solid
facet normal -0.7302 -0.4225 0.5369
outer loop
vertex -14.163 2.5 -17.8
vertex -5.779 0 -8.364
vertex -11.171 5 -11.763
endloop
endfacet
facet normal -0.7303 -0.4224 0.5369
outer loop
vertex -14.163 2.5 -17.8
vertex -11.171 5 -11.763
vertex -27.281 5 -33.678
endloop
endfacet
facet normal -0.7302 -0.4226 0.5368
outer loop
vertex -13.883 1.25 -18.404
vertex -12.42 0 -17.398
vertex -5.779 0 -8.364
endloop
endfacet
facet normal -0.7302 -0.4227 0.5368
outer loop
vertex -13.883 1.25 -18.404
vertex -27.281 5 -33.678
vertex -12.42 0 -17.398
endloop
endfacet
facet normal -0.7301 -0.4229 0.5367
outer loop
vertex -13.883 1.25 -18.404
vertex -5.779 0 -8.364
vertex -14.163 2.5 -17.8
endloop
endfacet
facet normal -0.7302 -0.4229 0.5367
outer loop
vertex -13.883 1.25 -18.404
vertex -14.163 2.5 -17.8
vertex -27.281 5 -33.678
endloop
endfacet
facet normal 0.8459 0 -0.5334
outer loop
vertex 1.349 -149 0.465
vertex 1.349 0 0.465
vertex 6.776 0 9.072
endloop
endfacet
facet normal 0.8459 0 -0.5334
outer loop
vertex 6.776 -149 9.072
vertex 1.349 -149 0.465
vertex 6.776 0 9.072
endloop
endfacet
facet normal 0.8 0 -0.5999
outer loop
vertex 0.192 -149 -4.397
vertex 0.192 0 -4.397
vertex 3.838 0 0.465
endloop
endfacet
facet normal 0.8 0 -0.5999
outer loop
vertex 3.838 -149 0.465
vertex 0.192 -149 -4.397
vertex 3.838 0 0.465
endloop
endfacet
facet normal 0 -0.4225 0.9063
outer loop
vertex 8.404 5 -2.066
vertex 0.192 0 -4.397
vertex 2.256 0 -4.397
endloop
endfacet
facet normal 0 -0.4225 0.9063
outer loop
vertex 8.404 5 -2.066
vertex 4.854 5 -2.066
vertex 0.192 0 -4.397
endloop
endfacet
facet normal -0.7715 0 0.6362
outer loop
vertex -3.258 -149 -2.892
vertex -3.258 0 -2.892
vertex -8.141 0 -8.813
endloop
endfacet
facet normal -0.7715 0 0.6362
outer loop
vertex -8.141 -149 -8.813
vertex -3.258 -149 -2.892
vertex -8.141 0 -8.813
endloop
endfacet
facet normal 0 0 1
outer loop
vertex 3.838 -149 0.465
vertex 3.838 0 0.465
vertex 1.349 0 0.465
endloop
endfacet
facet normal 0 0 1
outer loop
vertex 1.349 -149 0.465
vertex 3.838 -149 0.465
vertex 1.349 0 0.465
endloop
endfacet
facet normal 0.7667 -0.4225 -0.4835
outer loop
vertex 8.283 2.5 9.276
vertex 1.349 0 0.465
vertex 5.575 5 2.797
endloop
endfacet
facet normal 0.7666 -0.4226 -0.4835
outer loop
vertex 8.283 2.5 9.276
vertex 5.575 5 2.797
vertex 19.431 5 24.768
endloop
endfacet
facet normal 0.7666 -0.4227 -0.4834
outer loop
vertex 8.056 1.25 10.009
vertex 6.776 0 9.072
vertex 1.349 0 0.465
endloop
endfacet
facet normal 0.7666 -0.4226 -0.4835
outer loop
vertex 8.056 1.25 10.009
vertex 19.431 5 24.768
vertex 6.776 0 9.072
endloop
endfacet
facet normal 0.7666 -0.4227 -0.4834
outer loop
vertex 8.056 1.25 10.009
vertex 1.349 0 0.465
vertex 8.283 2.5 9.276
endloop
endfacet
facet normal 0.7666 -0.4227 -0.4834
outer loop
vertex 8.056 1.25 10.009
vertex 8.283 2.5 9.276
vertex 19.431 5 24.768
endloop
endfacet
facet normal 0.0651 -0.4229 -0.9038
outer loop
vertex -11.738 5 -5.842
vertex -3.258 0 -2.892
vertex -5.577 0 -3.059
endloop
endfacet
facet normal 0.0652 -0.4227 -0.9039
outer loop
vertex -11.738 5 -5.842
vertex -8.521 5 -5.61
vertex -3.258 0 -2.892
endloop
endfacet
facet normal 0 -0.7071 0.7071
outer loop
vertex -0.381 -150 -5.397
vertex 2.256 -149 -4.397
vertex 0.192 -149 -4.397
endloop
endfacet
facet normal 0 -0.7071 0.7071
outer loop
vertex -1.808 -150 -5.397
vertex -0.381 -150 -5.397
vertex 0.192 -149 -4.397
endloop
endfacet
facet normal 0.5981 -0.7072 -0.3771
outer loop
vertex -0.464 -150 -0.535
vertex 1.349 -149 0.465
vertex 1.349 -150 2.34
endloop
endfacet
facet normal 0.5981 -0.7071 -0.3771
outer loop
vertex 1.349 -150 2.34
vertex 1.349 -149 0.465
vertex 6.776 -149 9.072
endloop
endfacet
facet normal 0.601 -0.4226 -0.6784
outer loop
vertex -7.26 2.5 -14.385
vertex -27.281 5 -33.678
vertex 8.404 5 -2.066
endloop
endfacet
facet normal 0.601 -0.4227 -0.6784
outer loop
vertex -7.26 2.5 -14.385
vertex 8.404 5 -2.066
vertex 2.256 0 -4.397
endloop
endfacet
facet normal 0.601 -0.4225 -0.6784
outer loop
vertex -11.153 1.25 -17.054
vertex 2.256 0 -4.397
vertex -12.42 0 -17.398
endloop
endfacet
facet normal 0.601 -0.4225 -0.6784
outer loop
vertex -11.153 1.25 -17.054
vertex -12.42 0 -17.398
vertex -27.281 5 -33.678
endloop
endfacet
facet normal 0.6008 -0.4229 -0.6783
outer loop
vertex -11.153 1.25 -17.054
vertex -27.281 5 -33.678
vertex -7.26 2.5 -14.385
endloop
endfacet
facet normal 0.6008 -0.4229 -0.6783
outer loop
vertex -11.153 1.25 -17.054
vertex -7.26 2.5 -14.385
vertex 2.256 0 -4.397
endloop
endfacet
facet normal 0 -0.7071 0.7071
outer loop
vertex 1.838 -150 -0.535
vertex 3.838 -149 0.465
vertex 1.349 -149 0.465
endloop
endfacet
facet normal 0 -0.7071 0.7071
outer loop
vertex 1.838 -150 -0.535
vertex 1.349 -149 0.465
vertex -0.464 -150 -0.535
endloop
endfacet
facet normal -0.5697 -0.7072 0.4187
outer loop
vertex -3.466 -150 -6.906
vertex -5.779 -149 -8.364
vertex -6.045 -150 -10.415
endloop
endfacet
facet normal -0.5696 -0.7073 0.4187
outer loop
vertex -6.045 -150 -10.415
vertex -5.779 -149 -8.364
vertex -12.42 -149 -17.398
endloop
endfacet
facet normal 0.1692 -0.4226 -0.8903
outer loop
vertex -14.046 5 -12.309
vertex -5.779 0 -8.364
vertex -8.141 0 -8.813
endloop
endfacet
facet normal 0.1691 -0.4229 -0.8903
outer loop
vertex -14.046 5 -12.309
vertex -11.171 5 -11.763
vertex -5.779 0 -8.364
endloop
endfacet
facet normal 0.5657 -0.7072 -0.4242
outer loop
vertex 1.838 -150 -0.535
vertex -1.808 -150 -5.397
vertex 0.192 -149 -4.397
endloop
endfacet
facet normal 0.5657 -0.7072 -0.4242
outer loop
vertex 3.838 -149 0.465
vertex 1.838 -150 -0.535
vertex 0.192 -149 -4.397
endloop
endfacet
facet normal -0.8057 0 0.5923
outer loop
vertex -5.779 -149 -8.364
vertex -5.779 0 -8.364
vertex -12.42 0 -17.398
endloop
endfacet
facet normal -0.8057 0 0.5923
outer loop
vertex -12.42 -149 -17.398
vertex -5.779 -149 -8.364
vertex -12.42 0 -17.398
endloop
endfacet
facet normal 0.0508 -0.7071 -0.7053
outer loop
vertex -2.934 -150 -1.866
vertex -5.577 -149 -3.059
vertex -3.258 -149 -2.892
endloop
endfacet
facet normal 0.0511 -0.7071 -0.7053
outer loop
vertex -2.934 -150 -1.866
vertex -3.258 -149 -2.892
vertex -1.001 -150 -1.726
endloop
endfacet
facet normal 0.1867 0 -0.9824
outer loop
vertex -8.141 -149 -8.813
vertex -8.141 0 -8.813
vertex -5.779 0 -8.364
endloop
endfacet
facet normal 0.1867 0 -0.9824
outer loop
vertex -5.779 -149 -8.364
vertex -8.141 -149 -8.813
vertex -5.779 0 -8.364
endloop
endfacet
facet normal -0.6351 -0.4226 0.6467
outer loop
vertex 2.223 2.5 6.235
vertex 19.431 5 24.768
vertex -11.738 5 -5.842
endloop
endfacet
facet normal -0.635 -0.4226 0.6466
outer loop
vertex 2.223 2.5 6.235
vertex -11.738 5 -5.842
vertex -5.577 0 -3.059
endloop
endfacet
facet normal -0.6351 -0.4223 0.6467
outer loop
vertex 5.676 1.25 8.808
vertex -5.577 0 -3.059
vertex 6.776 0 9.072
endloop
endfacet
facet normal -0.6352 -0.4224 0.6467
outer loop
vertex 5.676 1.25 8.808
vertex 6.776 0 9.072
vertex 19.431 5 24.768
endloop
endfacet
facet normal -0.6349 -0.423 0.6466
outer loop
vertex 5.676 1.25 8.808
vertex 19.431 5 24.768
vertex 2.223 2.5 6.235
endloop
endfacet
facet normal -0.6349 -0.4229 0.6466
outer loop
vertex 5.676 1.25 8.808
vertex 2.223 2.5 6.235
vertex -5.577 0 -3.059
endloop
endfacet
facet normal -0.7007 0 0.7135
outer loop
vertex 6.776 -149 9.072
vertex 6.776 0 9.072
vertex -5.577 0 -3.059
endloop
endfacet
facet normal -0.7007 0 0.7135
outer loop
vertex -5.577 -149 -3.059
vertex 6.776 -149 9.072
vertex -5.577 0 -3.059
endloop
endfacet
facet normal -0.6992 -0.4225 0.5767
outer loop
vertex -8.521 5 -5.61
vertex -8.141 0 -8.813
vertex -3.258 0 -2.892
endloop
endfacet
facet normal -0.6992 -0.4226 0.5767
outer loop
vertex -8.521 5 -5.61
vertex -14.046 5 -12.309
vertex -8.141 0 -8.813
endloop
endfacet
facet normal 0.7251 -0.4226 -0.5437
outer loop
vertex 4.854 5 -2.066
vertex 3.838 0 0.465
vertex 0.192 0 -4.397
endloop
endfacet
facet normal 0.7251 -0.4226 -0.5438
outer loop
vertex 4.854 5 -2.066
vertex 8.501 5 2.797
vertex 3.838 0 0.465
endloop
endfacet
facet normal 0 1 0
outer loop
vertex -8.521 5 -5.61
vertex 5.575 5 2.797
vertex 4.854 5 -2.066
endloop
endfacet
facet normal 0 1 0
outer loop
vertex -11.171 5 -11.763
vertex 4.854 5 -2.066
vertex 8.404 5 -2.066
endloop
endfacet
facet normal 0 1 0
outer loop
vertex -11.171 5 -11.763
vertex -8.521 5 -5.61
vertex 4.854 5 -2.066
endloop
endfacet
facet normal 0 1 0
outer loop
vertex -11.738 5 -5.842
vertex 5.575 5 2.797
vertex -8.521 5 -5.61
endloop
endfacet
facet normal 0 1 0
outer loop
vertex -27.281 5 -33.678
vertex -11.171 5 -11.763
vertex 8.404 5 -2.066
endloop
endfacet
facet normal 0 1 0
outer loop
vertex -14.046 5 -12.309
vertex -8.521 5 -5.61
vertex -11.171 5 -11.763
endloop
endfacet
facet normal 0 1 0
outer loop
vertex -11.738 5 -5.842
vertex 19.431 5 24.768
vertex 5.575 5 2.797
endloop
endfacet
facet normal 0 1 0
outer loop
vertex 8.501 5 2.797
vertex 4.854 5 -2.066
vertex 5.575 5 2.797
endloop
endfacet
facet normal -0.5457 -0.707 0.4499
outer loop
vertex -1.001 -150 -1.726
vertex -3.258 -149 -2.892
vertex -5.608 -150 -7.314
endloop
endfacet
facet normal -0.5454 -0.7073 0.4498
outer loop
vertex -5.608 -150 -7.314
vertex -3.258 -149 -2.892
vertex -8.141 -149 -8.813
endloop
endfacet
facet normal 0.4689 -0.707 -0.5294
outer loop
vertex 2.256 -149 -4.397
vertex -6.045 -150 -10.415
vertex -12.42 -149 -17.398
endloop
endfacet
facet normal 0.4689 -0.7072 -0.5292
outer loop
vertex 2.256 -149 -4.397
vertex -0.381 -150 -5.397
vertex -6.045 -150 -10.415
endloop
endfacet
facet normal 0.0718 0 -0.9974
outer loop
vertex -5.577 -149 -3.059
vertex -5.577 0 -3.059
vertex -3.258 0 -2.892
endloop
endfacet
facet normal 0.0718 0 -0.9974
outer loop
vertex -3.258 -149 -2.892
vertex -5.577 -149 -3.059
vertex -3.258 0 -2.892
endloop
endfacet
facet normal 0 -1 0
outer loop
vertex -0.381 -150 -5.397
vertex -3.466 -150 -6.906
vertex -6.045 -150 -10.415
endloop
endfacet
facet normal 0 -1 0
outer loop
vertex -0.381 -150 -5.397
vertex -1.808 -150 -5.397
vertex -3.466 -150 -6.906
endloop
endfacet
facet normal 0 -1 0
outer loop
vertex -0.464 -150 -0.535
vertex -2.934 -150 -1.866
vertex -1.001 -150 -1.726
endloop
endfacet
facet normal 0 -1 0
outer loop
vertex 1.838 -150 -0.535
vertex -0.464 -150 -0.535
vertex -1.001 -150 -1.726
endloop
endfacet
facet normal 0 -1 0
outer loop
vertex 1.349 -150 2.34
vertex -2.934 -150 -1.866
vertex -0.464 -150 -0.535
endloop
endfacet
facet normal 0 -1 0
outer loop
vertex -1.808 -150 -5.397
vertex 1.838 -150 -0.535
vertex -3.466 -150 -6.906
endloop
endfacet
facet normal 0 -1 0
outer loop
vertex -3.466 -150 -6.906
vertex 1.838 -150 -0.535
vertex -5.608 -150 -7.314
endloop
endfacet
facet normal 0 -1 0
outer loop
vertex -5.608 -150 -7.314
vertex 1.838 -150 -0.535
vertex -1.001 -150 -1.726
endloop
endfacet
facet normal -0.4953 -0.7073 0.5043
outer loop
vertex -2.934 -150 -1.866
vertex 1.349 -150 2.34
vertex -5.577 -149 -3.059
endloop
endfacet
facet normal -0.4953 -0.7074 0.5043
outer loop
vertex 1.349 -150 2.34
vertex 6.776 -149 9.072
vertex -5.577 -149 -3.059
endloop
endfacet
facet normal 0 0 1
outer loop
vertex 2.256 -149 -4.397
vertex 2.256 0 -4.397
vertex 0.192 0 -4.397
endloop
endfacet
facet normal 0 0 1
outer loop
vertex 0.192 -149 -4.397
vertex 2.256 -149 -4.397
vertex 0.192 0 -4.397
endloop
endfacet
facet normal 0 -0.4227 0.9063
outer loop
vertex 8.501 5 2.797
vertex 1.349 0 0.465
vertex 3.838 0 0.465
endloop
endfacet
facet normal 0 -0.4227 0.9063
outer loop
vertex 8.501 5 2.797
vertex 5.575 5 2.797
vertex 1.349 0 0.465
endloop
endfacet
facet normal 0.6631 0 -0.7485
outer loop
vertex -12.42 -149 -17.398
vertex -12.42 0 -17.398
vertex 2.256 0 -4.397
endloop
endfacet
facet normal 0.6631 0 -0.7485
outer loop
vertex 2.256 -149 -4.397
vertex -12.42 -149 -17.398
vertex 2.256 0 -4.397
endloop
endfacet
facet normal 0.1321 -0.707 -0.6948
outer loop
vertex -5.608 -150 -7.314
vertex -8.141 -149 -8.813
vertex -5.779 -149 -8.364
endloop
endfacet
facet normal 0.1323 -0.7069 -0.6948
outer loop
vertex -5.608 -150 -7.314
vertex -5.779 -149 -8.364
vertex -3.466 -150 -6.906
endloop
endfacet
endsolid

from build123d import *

# Parameters (mm, degrees)
F1_DEPTH = 150
F2_DEPTH = 5
F2_TAPER = -25
F3_SIZE  = 1


with BuildPart() as f1:
    # F0 (on Front) → F1 (new body)
    with BuildSketch(Plane.XZ):
        Polygon((6.776461585, 9.0722467188), (-5.5767488922, -3.059325051), (-3.258036708, -2.8919032872), (-8.1410452514, -8.8131905165), (-5.7786260987, -8.3639572937), (-12.4195150821, -17.3975064051), (2.255862786, -4.3973731032), (0.1915401989, -4.3973731032), (3.8383661048, 0.4654207636), (1.3486526159, 0.4654207636), align=None)
    extrude(amount=F1_DEPTH)

    # F1_face (on face) → F2 (join)
    with BuildSketch(Plane(origin=(-2.1628477345, 0, -4.133992699), x_dir=(1, 0, 0), z_dir=(0, 1, 0))):
        Polygon((2.3543879334, 0.2633804043), (4.4187105205, 0.2633804043), (-10.2566673476, 13.2635137061), (-3.6157783642, 4.2299645948), (-5.9781975168, 4.6791978175), (-1.0951889734, -1.2420894118), (-3.4139011576, -1.074667648), (8.9393093195, -13.2062394177), (3.5115003504, -4.5994134625), (6.0012138393, -4.5994134625), align=None)
    extrude(amount=F2_DEPTH, taper=F2_TAPER)

    # F3
    f3_edges = [f1.edges().sort_by_distance(p)[0] for p in [
        (-5.081826, -150, -10.89744),
        (2.014953, -150, -1.965976),
        (1.223701, -150, -4.397373),
        (2.593509, -150, 0.465421),
        (4.062557, -150, 4.768834),
        (0.599856, -150, 3.006461),
        (-4.417393, -150, -2.975614),
        (-5.699541, -150, -5.852547),
        (-6.959836, -150, -8.588574),
        (-9.099071, -150, -12.880732),
    ]]
    chamfer(f3_edges, length=F3_SIZE)


solid = f1.part
